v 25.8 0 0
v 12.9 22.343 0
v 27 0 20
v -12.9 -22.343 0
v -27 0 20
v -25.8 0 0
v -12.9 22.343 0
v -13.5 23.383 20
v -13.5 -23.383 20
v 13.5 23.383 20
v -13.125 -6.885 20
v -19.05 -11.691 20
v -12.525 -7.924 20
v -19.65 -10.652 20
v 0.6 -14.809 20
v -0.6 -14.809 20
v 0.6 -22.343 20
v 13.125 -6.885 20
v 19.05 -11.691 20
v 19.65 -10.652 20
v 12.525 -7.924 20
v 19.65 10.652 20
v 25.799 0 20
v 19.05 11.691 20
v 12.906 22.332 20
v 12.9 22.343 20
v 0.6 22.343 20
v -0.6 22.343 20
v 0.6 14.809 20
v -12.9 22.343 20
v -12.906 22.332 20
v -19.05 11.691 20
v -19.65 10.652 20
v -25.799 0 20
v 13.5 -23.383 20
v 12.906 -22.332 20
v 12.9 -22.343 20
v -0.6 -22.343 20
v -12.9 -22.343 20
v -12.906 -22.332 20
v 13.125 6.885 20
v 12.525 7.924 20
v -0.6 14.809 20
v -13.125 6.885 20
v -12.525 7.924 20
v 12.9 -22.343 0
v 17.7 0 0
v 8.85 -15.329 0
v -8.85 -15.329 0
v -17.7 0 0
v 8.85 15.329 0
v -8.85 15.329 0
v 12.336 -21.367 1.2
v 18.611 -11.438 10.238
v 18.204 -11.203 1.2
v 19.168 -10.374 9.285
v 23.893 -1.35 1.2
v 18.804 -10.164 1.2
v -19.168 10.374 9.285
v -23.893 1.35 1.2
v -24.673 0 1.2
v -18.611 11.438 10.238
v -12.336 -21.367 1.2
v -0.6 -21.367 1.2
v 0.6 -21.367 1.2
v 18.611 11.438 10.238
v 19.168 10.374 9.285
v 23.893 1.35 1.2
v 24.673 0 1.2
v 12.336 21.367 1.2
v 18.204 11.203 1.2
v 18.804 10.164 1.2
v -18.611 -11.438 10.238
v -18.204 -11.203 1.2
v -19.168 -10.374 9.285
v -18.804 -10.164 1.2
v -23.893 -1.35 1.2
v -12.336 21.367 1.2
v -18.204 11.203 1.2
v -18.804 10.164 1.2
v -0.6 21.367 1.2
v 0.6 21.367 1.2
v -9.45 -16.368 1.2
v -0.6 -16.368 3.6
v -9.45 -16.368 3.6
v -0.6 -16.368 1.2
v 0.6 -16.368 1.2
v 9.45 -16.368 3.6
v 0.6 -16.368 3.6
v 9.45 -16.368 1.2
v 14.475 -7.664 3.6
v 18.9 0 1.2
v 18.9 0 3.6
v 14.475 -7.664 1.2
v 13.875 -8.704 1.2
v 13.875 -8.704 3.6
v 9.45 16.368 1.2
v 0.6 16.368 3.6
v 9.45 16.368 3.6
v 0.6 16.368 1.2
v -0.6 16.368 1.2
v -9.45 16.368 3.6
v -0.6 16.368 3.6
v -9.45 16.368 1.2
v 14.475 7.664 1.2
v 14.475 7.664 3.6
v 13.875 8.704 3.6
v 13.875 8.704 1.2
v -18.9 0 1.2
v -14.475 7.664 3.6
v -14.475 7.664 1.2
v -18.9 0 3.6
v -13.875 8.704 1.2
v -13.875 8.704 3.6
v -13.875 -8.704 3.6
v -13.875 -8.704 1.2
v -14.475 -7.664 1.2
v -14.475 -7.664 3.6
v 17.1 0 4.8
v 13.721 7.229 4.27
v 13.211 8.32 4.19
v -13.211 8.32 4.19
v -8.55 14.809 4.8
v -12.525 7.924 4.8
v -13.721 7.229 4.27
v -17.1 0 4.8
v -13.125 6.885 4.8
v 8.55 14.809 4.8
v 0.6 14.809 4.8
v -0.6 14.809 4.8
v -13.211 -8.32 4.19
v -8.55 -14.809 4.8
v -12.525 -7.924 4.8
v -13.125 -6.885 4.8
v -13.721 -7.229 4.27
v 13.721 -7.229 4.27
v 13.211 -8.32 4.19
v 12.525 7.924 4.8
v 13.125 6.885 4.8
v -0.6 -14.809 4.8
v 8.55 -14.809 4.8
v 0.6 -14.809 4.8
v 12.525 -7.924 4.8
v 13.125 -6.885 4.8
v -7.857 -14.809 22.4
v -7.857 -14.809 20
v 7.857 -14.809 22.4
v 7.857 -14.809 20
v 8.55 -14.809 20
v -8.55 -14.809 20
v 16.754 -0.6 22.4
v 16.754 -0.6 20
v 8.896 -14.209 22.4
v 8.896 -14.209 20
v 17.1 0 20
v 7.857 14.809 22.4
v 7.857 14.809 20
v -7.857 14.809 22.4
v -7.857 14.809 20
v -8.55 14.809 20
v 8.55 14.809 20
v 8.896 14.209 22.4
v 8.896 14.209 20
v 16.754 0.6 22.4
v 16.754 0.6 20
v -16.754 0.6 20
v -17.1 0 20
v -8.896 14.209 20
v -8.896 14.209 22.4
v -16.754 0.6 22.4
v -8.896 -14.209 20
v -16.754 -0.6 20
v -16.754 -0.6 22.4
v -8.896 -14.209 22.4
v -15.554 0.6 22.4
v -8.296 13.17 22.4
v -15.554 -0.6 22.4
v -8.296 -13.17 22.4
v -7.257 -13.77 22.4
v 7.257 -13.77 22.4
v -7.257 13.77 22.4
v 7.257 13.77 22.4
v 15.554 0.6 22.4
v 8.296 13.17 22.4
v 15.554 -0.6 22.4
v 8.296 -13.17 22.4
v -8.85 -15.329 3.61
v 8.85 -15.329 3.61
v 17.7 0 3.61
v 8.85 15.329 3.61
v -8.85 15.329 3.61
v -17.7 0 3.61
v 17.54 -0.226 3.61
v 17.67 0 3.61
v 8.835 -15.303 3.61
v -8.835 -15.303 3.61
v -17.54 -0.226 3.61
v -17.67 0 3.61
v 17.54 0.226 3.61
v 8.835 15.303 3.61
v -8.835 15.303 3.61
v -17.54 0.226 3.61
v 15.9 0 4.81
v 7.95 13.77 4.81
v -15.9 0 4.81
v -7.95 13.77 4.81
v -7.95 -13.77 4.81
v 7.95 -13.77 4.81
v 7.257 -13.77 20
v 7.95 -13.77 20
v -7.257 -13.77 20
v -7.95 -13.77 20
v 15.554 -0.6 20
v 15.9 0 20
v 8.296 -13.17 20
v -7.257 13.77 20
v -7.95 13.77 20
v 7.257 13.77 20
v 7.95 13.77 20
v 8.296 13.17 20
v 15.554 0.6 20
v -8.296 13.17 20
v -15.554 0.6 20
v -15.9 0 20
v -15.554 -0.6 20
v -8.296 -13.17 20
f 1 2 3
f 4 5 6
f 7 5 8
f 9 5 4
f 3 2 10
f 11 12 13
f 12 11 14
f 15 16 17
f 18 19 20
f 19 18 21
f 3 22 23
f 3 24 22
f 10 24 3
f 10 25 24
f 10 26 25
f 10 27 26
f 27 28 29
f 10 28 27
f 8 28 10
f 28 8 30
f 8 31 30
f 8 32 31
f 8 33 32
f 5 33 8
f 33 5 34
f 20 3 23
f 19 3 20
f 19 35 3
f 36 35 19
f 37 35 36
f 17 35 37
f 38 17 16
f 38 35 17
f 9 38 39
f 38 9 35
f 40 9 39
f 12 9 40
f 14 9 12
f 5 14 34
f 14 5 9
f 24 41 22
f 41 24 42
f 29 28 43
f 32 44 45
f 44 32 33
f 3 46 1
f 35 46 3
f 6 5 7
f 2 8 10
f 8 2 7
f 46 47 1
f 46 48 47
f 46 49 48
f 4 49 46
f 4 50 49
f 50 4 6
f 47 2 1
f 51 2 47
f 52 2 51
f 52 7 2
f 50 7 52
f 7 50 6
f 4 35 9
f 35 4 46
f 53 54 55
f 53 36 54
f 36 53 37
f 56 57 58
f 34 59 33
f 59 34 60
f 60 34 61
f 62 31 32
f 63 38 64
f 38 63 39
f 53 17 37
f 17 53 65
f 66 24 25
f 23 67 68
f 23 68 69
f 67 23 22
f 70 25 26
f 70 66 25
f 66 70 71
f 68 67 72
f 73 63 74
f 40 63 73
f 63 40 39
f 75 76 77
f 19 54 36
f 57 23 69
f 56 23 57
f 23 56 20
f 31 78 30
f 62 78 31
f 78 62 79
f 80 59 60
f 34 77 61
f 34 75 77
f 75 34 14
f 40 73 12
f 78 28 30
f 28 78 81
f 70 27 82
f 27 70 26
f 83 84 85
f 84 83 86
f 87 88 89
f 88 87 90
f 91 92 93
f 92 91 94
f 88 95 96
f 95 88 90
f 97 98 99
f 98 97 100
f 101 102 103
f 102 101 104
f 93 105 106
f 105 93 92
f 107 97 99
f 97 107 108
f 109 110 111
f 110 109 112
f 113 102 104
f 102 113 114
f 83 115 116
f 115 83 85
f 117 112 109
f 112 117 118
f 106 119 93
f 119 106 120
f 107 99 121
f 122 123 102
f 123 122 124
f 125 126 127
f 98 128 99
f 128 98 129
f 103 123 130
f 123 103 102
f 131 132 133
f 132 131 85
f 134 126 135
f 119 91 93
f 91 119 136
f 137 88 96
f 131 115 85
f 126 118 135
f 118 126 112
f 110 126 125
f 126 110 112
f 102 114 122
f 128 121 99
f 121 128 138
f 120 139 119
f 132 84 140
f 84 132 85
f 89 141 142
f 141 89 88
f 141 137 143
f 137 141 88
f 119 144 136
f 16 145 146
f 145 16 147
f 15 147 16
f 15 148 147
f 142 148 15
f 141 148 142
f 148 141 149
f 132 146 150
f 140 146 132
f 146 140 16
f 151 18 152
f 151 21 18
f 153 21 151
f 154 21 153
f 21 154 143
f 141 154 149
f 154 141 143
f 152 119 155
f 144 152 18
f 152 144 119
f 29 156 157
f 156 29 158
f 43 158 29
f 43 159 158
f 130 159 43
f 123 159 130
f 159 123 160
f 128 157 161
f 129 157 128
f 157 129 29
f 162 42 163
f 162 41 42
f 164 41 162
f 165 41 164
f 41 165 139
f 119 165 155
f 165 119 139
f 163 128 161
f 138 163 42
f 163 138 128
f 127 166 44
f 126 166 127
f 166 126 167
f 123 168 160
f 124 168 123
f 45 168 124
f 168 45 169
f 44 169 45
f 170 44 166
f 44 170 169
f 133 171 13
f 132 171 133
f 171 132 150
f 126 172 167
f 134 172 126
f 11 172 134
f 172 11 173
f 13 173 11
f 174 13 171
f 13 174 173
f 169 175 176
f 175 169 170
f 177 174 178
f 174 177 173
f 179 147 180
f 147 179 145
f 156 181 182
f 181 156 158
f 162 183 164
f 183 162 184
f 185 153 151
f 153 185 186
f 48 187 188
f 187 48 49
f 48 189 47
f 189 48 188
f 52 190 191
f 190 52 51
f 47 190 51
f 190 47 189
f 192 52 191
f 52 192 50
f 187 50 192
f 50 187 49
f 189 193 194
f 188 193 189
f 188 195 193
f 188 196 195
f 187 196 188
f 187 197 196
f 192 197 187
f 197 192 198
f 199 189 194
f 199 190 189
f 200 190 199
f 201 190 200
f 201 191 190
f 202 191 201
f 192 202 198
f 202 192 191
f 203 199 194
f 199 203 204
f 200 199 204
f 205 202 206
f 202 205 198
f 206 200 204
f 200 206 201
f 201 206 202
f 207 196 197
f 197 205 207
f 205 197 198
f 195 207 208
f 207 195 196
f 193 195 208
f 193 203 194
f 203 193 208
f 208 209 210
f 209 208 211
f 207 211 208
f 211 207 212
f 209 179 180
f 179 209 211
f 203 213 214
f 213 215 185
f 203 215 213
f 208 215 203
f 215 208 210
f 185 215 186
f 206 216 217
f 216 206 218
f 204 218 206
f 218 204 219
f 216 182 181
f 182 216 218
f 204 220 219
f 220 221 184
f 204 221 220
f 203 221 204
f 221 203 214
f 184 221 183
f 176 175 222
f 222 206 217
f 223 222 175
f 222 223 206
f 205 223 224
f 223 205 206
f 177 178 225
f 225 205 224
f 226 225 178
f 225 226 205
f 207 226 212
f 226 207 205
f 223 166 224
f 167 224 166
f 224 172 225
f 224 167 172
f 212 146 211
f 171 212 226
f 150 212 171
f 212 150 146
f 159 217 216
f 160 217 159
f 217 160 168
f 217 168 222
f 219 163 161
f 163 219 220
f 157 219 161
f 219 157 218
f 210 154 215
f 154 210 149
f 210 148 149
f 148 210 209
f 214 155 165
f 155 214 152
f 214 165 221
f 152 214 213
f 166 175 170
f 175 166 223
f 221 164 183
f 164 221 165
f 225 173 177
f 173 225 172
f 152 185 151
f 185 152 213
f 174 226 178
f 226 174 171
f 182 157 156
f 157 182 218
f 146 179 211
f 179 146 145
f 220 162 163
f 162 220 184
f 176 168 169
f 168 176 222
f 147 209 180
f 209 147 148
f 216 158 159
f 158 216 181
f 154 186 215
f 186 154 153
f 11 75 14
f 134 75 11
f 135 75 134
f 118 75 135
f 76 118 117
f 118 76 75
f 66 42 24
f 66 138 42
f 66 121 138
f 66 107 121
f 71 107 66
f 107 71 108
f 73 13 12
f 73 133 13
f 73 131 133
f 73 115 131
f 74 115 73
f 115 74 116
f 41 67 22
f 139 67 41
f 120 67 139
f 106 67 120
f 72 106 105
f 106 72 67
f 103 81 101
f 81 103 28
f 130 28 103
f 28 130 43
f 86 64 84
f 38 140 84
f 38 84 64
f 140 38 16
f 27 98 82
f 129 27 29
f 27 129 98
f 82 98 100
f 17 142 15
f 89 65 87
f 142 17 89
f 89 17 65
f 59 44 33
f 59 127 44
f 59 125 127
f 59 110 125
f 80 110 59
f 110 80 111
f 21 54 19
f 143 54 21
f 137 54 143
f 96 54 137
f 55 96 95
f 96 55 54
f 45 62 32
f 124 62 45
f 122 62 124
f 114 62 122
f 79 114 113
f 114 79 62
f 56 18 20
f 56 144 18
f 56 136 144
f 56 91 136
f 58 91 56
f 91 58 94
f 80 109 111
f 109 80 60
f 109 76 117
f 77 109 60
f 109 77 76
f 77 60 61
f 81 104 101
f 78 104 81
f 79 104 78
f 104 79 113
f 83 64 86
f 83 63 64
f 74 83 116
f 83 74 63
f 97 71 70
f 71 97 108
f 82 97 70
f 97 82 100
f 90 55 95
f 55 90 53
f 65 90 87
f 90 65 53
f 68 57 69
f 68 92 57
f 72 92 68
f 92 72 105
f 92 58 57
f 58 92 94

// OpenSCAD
// Height
height = 20; // [5:5:200]
// Wall thickness
wall = 1.2; // [0.4:0.1:2]
// Tolerance
tolerance = .6; // [0:0.1:1]
type = "spacer"; // ["spacer", "plate"]

/* [Hidden] */

in = 35.4 / 2;
out = 54 / 2;
width = 90;
depth = 3;

x = sqrt(60 * 60 - 30 * 30);

module inset(rr, extra=0) {
    translate([0, 0, 0 - extra]) cylinder(r=rr, h=depth + extra * 2 + tolerance, $fn=6);
    translate([0, 0, depth - extra + tolerance]) cylinder(r1=rr, r2=rr - wall - tolerance, h=wall + extra * 2, $fn=6);
    translate([0, 0, depth + wall - extra + tolerance]) cylinder(r=rr - wall - tolerance, h=height - wall + extra * 2 - tolerance * 2, $fn=6);
}

module outset(rr, extra=0) {
    translate([0, 0, 0 - extra]) cylinder(r1=rr - wall, r2=rr, h=height + extra * 2, $fn=6);   
}

module out_wall() {
    difference() {
        outset(out);
        outset(out - wall, .01);
    }
}

module in_wall() {
    difference() {
        inset(in + wall);
        inset(in, .01);
    }
}

module top_wall() {
    difference() {
        cylinder(r=out - wall, h=wall, $fn=6);   
        inset(in, .01);
    }
}

module internal_walls() {
    intersection() {
        difference() {
            for (i = [0 : 3]) {
                rotate([0, 0, i * 60 + 30]) translate([-width / 2, -wall / 2, 0]) cube([width, wall, height]);
            }
            inset(in, .01);
        }
        outset(out);
    }
}

module notches() {
    for (i = [0 : 3]) {
        rotate([0, 0, i * 60]) translate([-150, -wall / 2, height]) cube([300, wall, 5]);
    }
}

module spacer() {
    out_wall();
    difference() {
        in_wall();
        notches();
    }
    internal_walls();
    top_wall();
}

module plate_part() {
    difference() {
        union() {
            cylinder(r=x / 1.5, h=wall, $fn=6);   
            difference() {
                in_wall();
                notches();
            }
        }
        inset(in, .01);
    }
}

module plate() {
    ni = 2;
    nj = 1;
    for (i = [0 : ni]) {
        for (j = [-i % 2 : nj]) {
            translate([i * x, (i % 2 == 0 ? 0 : +30) + j * 60, 0]) {
                plate_part();
            }
        }
    }
}

if (type == "spacer") {
    spacer();
} else if (type == "plate") {
    plate();
} else if (type == "test") {
    difference() {
        union() {
            cylinder(r=22, h=wall, $fn=6);   
            difference() {
                in_wall();
                notches();
            }
        }
        inset(in, .01);
    }
}
